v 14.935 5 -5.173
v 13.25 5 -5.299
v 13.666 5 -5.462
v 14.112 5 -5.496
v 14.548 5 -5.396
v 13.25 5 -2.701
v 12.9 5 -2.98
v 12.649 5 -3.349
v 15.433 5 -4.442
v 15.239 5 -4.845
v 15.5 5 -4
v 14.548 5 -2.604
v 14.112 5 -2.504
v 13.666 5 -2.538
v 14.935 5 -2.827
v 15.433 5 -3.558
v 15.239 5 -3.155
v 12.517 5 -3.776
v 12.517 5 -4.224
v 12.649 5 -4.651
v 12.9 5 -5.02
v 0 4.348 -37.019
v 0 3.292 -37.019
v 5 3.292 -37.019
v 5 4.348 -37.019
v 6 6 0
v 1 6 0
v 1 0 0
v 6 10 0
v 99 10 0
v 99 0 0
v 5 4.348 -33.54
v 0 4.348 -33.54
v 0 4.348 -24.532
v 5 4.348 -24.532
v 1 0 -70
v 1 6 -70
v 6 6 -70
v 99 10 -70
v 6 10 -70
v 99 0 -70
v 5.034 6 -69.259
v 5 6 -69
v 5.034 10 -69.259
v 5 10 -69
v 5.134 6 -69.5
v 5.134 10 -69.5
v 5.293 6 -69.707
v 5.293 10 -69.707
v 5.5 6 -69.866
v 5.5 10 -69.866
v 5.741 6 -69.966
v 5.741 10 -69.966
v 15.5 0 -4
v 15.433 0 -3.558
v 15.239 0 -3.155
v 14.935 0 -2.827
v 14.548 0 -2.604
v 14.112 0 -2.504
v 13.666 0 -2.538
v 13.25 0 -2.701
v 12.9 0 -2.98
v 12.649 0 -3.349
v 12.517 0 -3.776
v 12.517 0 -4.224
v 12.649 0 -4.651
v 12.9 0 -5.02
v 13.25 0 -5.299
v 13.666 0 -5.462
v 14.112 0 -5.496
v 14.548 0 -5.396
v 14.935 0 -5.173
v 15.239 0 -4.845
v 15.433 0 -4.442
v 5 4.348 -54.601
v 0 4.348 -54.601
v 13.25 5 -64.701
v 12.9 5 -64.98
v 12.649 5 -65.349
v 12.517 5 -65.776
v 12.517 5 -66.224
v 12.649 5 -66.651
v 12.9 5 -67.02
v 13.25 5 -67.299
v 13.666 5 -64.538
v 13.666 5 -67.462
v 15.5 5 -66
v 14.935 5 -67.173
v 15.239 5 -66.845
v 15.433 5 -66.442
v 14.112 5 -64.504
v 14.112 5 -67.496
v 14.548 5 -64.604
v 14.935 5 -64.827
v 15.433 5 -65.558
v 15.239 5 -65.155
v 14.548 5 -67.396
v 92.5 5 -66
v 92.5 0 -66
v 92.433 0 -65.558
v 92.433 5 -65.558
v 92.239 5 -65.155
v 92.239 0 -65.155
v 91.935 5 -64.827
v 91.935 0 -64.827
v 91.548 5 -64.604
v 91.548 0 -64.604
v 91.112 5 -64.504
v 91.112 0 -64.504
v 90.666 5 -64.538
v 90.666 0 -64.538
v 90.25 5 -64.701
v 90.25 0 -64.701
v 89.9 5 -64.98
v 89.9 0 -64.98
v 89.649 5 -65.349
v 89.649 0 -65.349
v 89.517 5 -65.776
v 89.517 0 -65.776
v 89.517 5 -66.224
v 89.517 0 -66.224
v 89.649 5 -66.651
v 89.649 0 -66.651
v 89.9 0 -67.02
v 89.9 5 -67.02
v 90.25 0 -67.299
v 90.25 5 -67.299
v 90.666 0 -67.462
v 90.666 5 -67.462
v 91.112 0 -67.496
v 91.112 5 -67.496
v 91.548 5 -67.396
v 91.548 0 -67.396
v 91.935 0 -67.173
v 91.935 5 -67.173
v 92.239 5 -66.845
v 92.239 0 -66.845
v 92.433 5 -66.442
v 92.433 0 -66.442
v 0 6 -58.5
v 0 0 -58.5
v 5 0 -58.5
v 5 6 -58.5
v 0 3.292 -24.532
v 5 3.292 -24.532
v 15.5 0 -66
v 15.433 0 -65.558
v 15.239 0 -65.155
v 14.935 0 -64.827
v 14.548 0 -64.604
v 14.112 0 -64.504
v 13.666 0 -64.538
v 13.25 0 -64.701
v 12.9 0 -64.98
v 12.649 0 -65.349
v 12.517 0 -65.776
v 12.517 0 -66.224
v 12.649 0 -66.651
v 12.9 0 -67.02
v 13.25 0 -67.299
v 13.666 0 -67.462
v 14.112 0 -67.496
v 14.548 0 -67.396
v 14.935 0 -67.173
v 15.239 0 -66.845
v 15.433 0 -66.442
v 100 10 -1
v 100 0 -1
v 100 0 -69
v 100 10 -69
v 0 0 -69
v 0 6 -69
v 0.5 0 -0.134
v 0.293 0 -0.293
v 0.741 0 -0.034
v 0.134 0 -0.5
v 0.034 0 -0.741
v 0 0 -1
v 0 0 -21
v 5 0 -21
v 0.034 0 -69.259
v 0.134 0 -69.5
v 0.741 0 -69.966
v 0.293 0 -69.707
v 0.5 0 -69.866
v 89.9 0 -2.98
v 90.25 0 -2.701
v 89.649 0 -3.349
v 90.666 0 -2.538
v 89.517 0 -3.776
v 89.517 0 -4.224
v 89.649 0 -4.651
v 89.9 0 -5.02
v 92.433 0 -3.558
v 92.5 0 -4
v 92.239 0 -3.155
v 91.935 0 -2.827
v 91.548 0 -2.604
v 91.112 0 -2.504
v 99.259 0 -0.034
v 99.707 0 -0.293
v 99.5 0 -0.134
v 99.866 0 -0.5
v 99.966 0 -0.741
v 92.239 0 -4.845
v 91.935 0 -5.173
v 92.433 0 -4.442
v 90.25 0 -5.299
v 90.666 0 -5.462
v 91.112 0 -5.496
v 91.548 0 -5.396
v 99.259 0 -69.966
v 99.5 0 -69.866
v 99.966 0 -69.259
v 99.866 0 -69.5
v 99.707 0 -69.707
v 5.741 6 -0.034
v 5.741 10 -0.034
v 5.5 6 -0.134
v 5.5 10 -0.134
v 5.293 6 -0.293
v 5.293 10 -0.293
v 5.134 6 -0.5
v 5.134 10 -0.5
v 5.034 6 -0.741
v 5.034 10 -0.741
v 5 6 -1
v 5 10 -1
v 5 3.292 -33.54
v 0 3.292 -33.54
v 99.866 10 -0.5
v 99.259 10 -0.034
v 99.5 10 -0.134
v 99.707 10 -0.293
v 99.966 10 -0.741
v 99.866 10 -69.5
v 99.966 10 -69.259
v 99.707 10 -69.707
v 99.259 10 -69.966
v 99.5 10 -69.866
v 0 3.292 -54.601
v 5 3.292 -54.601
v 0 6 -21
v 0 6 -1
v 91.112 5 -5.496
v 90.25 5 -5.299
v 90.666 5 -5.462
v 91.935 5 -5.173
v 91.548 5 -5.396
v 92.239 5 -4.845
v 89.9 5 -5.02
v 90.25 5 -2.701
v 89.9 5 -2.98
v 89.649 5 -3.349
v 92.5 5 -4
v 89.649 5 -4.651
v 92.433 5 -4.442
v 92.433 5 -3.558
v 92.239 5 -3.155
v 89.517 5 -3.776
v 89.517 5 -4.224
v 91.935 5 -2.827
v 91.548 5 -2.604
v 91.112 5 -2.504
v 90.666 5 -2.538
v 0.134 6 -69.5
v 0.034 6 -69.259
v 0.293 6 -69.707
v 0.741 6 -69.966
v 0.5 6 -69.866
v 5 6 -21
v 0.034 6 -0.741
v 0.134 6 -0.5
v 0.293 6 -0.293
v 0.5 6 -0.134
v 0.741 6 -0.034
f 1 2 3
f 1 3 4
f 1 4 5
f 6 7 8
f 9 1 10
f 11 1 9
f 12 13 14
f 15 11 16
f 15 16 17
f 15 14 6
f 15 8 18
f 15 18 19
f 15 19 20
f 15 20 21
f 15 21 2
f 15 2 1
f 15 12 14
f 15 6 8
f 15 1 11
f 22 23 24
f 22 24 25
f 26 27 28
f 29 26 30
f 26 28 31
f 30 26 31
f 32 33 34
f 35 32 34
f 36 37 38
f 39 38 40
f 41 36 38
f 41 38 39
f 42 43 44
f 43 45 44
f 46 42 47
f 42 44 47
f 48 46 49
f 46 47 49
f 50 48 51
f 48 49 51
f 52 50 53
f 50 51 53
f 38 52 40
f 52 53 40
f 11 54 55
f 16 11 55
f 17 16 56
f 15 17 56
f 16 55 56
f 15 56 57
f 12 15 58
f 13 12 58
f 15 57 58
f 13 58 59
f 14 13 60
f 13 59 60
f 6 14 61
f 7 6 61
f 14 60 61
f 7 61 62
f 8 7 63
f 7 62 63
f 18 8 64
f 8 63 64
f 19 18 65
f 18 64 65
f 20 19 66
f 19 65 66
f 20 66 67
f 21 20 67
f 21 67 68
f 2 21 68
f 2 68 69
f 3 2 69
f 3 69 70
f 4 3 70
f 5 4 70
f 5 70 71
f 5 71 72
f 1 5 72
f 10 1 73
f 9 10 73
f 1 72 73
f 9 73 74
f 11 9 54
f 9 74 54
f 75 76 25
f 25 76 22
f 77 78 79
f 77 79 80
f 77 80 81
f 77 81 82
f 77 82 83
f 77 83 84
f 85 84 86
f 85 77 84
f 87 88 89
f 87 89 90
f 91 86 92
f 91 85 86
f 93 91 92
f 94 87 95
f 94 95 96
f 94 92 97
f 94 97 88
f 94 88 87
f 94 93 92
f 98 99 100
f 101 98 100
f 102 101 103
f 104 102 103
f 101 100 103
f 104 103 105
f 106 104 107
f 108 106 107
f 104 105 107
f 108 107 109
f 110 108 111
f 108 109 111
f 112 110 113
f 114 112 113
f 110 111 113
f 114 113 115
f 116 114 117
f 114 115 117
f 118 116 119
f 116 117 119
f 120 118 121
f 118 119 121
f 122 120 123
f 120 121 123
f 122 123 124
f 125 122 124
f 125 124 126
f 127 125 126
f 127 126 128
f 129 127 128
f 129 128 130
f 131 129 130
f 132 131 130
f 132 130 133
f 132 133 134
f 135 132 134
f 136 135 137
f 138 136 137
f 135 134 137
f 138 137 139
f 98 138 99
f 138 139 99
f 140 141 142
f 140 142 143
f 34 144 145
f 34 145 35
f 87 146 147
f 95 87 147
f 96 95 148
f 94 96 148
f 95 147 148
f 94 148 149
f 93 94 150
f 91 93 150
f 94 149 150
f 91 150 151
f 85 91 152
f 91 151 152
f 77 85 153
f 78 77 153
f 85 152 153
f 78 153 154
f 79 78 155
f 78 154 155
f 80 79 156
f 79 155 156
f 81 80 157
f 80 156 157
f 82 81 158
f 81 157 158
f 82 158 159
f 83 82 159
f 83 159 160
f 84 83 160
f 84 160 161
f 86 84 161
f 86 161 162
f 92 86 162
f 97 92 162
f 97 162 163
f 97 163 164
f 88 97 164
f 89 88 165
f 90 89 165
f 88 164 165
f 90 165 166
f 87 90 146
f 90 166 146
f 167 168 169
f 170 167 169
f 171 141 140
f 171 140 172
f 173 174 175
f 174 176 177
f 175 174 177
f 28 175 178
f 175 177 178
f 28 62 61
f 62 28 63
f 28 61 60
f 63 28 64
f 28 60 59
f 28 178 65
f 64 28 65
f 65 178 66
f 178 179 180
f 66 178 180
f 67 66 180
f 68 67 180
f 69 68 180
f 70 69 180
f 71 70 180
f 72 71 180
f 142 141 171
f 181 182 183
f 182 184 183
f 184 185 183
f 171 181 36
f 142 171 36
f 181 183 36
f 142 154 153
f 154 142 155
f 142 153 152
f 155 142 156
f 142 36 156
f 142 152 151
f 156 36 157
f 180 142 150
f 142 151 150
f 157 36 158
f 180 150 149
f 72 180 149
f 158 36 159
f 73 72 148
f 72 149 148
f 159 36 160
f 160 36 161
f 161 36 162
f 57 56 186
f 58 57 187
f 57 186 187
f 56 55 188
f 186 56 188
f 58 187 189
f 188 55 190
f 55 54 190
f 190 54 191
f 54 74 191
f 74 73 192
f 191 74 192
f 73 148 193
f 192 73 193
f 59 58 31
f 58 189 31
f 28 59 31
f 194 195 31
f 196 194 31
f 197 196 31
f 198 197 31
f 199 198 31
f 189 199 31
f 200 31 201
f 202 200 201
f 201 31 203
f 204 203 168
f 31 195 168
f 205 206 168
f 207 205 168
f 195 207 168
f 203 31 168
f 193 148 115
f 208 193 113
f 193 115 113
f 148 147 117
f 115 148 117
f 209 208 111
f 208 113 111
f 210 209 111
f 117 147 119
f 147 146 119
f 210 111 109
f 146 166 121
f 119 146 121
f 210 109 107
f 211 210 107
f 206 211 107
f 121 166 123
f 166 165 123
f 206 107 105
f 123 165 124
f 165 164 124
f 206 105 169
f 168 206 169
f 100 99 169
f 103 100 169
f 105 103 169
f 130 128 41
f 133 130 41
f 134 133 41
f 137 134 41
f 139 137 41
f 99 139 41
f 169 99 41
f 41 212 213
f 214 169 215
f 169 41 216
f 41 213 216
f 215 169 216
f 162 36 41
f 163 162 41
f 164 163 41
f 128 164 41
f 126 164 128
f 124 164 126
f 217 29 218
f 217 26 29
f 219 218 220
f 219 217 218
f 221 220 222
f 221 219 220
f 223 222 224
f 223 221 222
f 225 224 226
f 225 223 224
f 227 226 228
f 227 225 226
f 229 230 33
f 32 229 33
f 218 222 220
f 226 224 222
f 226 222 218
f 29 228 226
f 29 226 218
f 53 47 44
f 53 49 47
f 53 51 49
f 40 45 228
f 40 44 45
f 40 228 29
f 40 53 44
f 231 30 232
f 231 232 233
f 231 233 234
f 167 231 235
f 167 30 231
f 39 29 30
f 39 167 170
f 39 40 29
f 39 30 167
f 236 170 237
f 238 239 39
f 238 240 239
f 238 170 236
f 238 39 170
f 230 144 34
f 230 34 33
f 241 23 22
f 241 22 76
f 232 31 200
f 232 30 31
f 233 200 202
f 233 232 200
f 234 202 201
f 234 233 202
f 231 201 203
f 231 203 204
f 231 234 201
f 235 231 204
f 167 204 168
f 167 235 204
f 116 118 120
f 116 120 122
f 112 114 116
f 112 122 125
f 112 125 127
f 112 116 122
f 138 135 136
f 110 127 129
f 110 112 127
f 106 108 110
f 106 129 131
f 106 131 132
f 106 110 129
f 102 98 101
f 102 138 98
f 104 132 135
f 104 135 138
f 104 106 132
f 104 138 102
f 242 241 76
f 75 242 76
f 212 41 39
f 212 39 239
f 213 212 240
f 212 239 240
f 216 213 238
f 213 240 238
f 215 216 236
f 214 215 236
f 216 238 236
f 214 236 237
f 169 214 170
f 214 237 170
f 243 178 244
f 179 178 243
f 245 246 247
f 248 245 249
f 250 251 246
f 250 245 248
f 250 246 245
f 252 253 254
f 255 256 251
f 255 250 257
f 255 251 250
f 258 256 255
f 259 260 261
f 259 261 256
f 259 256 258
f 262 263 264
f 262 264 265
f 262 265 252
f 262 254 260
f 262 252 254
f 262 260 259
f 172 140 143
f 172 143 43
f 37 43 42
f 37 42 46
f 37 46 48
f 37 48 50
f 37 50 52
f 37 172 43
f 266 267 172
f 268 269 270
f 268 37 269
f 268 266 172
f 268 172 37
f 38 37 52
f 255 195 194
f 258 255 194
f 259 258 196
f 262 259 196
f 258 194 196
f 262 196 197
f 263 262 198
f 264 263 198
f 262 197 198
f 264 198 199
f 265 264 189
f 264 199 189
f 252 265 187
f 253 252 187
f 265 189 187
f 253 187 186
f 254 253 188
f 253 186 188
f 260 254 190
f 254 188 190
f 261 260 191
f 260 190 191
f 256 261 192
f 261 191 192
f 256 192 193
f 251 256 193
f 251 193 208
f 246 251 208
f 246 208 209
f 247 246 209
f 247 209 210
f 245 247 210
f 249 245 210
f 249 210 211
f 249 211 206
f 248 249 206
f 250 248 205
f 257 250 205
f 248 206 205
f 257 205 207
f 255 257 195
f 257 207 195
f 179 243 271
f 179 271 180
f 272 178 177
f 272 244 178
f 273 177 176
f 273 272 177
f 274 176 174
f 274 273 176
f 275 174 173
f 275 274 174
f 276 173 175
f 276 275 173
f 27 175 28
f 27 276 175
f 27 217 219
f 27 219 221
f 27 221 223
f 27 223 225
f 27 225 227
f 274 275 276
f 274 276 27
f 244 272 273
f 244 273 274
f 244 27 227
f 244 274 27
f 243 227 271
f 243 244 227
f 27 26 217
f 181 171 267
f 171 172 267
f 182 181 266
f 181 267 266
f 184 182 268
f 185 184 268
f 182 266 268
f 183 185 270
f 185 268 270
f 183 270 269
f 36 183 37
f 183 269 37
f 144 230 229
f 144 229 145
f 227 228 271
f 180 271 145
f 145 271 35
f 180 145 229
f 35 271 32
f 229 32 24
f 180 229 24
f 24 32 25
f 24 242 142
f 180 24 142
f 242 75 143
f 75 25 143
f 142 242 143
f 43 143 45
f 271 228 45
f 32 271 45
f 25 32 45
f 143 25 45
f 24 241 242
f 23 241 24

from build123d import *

# Parameters (mm, degrees)
SKETCH1_W           = 100
SKETCH1_H           = 70
BOSS_EXTRUDE1_DEPTH = 10
SKETCH2_R           = 1.5
CUT_EXTRUDE1_DEPTH  = 5
SKETCH3_W           = 17.581829542
SKETCH3_H           = 1.056152304
SKETCH3_W_2         = 9.008357892
CUT_EXTRUDE2_DEPTH  = 5
FILLET1_R           = 1


with BuildPart() as part:
    # Sketch1 → Boss-Extrude1 (new body)
    with BuildSketch(Plane(origin=(0, 0, 0), x_dir=(1, 0, 0), z_dir=(0, 1, 0))):
        with Locations((50, 35)):
            Rectangle(SKETCH1_W, SKETCH1_H)
    extrude(amount=BOSS_EXTRUDE1_DEPTH)

    # Sketch2 → Cut-Extrude1 (cut)
    with BuildSketch(Plane.XZ):
        with Locations((14, -4)):
            Circle(SKETCH2_R)
        with Locations((14, -66)):
            Circle(SKETCH2_R)
        with Locations((91, -66)):
            Circle(SKETCH2_R)
        with Locations((91, -4)):
            Circle(SKETCH2_R)
    extrude(amount=-CUT_EXTRUDE1_DEPTH, mode=Mode.SUBTRACT)

    # Sketch3 → Cut-Extrude2 (cut)
    with BuildSketch(Plane.ZY):
        Polygon((-70, 6), (-70, 10), (0, 10), (0, 6), (-21, 6), (-21, 0), (-58.5, 0), (-58.5, 6), align=None)
        with Locations((-45.810029471, 3.819594483)):
            Rectangle(SKETCH3_W, SKETCH3_H, mode=Mode.SUBTRACT)
        with Locations((-29.035845809, 3.819594483)):
            Rectangle(SKETCH3_W_2, SKETCH3_H, mode=Mode.SUBTRACT)
    extrude(amount=-CUT_EXTRUDE2_DEPTH, mode=Mode.SUBTRACT)

    # Fillet1
    fillet1_edges = [part.edges().sort_by_distance(p)[0] for p in [
        (0, 3, -70),
        (0, 3, 0),
        (5, 8, -70),
        (5, 8, 0),
        (100, 5, -70),
        (100, 5, 0),
    ]]
    fillet(fillet1_edges, radius=FILLET1_R)


solid = part.part
